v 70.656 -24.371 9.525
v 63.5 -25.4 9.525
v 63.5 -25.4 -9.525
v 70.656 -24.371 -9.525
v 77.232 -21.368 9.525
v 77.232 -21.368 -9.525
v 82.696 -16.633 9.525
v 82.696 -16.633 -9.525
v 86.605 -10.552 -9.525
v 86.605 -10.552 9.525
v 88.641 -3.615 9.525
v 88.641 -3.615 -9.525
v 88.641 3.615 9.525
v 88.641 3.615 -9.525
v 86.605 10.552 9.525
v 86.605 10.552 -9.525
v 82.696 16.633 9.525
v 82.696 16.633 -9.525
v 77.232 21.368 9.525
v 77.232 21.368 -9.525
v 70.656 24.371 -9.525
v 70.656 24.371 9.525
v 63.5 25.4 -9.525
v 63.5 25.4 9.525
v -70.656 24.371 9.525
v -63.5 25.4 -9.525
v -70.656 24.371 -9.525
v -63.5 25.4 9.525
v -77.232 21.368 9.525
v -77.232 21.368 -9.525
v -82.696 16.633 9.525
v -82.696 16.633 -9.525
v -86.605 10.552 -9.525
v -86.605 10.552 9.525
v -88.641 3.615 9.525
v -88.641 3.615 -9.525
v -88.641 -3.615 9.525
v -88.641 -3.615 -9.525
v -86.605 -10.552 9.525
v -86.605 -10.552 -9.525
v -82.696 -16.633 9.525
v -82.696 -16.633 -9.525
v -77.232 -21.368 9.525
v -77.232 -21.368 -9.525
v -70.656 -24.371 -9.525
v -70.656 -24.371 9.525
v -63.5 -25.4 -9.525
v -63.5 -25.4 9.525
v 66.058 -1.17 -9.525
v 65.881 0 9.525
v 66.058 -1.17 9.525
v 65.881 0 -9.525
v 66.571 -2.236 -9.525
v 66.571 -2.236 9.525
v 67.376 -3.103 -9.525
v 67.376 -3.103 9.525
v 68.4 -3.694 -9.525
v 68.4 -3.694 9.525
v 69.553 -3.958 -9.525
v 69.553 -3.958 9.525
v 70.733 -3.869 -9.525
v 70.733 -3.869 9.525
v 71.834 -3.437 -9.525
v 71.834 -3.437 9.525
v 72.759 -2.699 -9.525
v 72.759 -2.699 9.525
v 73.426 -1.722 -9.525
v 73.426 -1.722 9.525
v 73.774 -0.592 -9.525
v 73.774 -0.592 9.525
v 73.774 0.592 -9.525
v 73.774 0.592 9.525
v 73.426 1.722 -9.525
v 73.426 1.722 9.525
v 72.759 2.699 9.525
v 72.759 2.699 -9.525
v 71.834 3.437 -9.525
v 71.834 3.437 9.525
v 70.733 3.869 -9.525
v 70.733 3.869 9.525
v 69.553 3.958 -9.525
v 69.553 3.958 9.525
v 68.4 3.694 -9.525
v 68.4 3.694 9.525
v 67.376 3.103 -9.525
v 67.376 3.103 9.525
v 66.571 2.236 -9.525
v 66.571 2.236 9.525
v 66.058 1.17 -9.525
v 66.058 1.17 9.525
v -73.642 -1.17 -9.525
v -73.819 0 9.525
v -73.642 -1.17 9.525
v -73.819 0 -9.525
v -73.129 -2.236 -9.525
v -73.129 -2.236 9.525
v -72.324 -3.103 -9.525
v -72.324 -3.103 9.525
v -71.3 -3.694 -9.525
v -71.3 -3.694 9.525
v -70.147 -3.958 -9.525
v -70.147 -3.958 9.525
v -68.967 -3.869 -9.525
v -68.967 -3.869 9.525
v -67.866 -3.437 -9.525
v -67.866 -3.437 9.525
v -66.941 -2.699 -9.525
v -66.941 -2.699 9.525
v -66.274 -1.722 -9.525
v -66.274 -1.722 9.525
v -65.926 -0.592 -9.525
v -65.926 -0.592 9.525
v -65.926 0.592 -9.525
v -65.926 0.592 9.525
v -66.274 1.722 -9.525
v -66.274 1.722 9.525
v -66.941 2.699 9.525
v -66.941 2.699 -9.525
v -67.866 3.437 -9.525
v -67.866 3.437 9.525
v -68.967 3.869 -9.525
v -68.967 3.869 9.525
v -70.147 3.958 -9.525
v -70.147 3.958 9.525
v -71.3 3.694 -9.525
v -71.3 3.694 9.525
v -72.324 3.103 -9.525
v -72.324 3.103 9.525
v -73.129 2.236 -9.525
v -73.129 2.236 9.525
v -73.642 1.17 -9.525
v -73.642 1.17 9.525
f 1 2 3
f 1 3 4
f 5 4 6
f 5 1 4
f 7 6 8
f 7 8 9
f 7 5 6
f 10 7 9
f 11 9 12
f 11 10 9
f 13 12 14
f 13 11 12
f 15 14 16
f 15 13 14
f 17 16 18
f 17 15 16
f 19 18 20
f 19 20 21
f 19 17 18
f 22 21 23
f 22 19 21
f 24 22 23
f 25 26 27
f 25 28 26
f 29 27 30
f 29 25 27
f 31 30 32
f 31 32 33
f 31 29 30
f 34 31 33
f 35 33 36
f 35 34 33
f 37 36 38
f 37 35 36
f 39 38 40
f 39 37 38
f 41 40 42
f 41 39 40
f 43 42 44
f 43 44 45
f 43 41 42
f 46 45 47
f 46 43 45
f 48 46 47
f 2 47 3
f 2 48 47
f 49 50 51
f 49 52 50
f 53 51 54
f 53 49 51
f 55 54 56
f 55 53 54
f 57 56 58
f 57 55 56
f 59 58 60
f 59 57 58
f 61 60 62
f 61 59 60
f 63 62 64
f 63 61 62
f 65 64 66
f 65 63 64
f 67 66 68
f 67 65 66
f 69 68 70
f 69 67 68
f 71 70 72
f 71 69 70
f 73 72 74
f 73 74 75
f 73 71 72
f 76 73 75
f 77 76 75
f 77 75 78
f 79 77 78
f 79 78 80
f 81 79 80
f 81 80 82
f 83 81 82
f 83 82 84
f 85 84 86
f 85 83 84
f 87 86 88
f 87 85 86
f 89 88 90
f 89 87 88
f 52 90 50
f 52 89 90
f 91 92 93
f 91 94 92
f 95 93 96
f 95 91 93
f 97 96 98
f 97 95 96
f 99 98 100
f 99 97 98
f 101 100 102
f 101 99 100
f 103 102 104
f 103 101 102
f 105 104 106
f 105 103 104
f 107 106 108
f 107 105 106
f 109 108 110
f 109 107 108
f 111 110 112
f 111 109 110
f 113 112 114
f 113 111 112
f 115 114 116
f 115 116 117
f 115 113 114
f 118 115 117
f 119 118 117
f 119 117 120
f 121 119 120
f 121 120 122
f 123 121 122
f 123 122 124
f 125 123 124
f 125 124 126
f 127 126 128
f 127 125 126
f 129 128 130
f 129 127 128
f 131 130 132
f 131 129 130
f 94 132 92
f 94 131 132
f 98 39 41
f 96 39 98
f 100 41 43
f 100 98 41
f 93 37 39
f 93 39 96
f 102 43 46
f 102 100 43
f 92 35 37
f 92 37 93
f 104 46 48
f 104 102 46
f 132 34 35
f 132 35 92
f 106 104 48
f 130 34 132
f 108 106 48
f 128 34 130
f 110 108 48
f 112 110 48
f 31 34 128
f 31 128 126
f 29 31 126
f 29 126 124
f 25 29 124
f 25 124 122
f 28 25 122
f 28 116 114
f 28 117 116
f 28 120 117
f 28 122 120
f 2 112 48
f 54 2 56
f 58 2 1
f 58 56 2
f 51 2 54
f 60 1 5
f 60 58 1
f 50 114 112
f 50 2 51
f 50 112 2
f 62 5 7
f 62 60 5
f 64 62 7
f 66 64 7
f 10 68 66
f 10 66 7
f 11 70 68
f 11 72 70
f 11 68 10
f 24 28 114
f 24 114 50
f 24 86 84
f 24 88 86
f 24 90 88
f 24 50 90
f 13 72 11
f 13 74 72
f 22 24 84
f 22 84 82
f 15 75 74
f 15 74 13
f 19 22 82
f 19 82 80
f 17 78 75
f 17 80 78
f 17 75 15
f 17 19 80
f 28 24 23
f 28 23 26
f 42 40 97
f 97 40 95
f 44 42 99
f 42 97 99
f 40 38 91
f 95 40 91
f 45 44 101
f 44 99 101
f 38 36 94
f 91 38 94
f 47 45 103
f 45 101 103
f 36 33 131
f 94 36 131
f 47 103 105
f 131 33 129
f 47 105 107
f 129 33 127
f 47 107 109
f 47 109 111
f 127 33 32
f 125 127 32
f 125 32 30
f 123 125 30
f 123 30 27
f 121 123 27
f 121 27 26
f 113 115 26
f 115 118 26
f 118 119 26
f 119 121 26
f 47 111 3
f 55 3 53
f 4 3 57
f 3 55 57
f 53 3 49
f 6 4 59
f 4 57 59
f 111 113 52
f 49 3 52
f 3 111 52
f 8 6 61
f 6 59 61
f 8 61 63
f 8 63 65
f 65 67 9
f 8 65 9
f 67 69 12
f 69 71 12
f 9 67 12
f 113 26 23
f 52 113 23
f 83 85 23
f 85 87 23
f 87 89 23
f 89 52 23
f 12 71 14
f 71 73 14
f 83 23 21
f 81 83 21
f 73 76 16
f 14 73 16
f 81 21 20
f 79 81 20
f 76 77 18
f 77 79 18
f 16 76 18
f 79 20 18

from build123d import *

# Parameters (mm, degrees)
SKETCH1_R           = 3.96875
BOSS_EXTRUDE1_DEPTH = 9.525


with BuildPart() as part:
    # Sketch1 → Boss-Extrude1 (new, symmetric)
    with BuildSketch(Plane.XY):
        with BuildLine():
            Line((-63.5, -25.4), (63.5, -25.4))
            ThreePointArc((63.5, -25.4), (88.9, 0), (63.5, 25.4))
            Line((63.5, 25.4), (-63.5, 25.4))
            ThreePointArc((-63.5, 25.4), (-88.9, 0), (-63.5, -25.4))
        make_face()
        with Locations(Location((-69.85, 0, 0), (0, 0, 180))):
            Circle(SKETCH1_R, mode=Mode.SUBTRACT)
        with Locations(Location((69.85, 0, 0), (0, 0, 180))):
            Circle(SKETCH1_R, mode=Mode.SUBTRACT)
    extrude(amount=BOSS_EXTRUDE1_DEPTH, both=True)


solid = part.part
